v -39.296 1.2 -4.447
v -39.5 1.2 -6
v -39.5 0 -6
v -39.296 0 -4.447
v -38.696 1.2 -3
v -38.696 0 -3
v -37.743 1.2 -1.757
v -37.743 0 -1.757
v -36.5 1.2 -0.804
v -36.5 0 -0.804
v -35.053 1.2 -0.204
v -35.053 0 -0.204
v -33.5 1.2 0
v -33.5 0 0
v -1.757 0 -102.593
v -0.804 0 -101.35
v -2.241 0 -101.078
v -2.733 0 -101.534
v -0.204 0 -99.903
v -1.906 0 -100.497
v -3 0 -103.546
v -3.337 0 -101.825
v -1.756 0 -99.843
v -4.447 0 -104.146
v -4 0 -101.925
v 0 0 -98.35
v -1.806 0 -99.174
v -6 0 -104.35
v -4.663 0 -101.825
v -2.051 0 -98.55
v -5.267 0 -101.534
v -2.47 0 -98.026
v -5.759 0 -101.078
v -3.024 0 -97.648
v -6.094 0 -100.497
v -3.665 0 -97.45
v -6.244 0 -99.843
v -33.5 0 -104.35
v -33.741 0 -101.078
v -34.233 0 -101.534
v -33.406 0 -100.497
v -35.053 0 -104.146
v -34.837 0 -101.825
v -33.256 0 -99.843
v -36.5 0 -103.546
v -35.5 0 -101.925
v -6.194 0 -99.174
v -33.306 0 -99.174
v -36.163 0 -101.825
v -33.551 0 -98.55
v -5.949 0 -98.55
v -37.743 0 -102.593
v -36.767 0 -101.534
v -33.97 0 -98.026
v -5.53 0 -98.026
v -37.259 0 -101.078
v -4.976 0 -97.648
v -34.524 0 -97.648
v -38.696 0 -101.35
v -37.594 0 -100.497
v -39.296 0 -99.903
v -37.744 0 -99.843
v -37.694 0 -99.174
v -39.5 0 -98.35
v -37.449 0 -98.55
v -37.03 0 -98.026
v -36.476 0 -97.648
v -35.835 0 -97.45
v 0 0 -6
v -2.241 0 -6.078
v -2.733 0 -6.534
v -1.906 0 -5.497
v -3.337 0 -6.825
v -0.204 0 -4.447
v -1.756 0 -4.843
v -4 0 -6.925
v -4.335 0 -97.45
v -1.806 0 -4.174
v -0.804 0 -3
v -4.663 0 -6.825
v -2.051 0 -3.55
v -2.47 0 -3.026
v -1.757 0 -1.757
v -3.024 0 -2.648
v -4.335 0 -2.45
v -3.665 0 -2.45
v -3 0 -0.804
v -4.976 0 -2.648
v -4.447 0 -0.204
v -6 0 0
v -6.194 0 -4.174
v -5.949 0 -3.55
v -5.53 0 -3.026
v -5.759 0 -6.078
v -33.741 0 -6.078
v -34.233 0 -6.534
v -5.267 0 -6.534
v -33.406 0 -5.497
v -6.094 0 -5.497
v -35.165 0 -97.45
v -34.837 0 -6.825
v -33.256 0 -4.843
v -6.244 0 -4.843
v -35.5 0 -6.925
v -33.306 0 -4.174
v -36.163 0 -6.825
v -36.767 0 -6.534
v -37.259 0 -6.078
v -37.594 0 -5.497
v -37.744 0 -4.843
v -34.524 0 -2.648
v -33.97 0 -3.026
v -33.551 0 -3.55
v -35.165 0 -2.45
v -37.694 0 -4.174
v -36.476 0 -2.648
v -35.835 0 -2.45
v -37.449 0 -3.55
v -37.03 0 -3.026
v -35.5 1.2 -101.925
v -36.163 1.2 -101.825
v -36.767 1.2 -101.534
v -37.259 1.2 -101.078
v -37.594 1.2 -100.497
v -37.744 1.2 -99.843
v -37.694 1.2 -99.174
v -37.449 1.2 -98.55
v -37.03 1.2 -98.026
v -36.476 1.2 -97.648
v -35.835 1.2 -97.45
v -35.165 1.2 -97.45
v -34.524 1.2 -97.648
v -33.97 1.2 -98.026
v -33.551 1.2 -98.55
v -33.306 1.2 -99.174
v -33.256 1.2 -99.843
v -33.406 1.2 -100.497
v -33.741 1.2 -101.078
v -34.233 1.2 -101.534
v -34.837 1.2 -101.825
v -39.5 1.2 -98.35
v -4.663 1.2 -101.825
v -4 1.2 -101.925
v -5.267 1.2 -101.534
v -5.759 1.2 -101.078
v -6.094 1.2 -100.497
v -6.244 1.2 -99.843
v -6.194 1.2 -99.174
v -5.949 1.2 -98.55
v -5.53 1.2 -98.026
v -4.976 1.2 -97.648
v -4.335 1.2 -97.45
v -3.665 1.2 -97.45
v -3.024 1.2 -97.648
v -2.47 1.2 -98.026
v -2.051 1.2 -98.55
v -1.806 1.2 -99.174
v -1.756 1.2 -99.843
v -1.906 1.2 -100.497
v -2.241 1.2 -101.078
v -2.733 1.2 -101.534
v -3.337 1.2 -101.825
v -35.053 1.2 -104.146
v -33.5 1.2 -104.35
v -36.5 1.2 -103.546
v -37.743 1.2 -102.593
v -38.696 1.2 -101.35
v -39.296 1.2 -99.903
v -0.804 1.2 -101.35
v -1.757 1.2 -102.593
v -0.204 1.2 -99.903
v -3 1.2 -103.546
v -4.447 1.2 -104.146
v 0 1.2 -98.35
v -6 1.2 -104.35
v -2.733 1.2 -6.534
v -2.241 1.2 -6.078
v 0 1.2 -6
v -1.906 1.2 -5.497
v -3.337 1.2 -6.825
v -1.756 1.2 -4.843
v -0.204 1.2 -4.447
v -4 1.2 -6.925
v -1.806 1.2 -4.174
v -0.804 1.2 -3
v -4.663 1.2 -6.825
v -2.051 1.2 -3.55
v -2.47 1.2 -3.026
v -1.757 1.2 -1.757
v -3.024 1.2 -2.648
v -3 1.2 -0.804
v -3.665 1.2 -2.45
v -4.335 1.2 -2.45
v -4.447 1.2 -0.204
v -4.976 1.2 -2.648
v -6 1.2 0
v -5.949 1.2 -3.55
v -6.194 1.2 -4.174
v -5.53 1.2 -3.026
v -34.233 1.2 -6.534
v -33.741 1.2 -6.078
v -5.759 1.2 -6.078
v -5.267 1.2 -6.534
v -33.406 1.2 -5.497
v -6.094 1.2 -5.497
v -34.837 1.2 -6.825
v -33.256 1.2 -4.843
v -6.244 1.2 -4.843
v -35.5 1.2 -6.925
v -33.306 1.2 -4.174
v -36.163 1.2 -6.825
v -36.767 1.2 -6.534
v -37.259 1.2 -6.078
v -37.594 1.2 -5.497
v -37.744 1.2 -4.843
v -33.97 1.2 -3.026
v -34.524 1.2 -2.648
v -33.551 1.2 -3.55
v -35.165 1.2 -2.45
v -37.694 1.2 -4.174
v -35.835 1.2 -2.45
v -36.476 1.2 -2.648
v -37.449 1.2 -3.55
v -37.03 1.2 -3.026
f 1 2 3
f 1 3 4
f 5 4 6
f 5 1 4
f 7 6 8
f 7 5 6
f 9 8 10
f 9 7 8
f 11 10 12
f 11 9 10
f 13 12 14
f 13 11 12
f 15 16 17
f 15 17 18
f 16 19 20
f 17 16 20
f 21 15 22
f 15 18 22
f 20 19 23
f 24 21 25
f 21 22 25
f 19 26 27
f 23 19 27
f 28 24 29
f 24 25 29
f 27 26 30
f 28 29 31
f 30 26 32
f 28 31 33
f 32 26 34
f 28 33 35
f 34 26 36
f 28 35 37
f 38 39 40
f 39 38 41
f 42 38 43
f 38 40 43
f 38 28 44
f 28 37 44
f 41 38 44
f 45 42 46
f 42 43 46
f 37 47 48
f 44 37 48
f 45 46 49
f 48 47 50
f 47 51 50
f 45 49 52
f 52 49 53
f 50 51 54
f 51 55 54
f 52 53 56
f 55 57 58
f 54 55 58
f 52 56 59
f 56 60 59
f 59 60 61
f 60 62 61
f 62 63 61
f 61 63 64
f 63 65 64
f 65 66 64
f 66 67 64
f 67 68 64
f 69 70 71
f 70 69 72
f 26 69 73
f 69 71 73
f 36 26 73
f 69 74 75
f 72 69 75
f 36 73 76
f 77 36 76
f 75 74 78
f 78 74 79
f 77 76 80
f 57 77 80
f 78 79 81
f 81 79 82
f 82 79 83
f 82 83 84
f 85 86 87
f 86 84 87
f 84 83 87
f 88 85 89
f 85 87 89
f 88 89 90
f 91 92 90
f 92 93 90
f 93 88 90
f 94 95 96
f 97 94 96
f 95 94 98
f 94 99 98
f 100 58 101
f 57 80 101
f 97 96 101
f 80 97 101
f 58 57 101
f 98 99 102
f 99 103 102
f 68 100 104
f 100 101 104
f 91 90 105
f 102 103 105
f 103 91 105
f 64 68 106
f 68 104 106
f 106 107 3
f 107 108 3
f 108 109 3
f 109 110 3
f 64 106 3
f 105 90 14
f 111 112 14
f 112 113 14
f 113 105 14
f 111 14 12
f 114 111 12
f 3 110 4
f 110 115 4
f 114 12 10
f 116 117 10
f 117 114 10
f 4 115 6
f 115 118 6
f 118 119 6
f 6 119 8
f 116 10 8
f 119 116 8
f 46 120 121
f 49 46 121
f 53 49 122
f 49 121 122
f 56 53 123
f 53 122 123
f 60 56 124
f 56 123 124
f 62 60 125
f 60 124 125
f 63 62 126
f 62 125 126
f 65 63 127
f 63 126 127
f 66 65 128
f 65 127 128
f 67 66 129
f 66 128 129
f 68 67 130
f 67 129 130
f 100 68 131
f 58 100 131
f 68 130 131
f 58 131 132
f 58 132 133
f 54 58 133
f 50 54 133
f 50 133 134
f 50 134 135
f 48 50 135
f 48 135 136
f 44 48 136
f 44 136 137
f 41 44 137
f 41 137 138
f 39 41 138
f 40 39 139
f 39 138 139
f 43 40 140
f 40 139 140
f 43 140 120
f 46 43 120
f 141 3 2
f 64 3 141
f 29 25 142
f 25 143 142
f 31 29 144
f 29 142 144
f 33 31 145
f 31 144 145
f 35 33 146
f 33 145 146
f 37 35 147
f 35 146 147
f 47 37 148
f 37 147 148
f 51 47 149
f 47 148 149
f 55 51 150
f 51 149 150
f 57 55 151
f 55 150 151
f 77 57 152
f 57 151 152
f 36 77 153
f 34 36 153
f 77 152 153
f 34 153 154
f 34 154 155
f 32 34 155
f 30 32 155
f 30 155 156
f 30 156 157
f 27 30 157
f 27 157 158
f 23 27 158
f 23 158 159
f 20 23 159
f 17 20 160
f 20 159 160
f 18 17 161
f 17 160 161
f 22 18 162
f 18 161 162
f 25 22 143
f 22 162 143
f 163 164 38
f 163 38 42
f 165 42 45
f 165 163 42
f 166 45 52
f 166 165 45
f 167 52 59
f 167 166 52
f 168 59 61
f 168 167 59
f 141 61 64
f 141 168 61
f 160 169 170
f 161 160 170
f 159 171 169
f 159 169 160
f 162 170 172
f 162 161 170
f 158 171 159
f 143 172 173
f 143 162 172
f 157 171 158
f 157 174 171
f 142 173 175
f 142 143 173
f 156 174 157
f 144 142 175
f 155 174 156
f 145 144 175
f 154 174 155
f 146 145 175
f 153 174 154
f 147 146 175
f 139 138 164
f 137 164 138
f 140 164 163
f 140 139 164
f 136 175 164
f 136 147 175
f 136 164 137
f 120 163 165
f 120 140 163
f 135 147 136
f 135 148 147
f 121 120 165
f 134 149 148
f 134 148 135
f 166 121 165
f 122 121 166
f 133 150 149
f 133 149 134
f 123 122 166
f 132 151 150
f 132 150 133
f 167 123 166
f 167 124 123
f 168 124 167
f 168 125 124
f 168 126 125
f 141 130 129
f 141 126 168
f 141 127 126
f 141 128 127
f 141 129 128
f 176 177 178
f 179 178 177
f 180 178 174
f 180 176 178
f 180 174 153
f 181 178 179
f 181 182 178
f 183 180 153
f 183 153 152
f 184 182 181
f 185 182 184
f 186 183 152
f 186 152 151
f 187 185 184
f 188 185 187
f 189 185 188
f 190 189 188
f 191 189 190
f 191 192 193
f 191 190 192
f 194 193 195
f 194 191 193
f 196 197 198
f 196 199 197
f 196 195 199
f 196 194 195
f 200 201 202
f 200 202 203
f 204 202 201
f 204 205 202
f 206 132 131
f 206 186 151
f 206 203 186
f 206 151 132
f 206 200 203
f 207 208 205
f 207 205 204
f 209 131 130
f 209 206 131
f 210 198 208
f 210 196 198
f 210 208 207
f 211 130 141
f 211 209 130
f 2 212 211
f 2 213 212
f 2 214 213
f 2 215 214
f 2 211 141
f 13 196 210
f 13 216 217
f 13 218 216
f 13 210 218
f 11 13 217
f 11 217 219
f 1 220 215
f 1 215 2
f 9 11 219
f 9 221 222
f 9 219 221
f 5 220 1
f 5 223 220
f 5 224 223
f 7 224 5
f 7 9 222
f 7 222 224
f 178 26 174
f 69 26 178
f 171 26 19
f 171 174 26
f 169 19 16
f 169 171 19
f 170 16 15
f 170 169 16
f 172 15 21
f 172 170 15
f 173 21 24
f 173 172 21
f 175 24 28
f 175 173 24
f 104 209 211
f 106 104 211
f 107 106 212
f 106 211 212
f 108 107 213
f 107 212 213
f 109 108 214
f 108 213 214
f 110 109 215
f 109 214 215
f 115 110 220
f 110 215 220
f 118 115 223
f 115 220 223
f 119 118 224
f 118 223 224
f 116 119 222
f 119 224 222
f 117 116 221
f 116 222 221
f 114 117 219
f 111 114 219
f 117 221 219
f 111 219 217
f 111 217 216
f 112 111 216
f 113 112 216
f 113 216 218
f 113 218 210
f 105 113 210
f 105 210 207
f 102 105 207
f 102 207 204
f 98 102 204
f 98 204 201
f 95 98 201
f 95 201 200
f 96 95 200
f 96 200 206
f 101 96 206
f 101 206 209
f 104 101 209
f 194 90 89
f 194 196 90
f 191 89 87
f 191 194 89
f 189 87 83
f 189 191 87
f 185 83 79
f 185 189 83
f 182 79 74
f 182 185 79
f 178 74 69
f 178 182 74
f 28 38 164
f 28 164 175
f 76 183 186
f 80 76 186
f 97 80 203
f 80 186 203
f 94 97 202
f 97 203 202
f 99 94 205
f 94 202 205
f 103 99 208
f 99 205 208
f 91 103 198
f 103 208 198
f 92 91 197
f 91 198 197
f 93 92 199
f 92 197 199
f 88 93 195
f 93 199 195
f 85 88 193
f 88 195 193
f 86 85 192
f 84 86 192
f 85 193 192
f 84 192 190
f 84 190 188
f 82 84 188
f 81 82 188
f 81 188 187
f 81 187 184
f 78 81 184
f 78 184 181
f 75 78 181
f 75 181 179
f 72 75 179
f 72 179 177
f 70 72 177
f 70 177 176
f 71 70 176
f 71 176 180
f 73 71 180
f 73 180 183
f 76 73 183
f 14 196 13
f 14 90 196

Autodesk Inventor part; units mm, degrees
ref_plane "YZ Plane" through (0, 0, 0) normal (1, 0, 0) x (0, 1, 0)
ref_plane "XZ Plane" through (0, 0, 0) normal (0, 1, 0) x (-1, 0, 0)
ref_plane "XY Plane" through (0, 0, 0) normal (0, 0, 1) x (1, 0, 0)
sketch "Sketch1" plane through (0, 0, 0) normal (0, 1, 0) x (-1, 0, 0)
  line L0 (0, 0) -> (39.5, 0)
  line L1 (39.5, 0) -> (39.5, -104.35)
  line L2 (39.5, -104.35) -> (0, -104.35)
  line L3 (0, -104.35) -> (0, 0)
  dimension "d0" = 104.35
  dimension "d1" = 39.5
extrude "Extrusion1" add sketch "Sketch1" along normal blind 1.2
fillet "Fillet1" radius 6 4 edges at (0, 0.6, 0) (-39.5, 0.6, 0) (0, 0.6, -104.35) (-39.5, 0.6, -104.35)
sketch "Sketch2" plane through (0, 0, 0) normal (0, -1, 0) x (1, 0, 0)
  line L0 (-35.5, -99.675) -> (-4, -99.675) construction
  line L1 (-4, -99.675) -> (-4, -4.675) construction
  line L2 (-4, -4.675) -> (-35.5, -4.675) construction
  line L3 (-35.5, -4.675) -> (-35.5, -99.675) construction
  line L4 (0, -98.35) -> (0, -6) construction
  line L5 (-39.5, -6) -> (-39.5, -98.35) construction
  line L6 (-6, 0) -> (-33.5, 0) construction
  line L7 (-33.5, -104.35) -> (-6, -104.35) construction
  point P0 (0, 0)
  dimension "d5" = 95
  dimension "d6" = 31.5
  dimension "d7" = 39.5
  dimension "d8" = 4
  dimension "d9" = 104.35
  dimension "d10" = 4.675
hole "Hole1" at (-35.5, 0, -99.675) at (-4, 0, -99.675) at (-4, 0, -4.675) at (-35.5, 0, -4.675) direction (0, 1, 0) diameter 4.5 depth 1.2 clearance for "Flat Head Machine Screw" size "M4" standard "Ansi Metric M Profile"
equation "\"d8\" = -0.5 * d6 + 0.5 * d7"
equation "\"d10\" = -0.5 * d5 + 0.5 * d9"
properties part number "PCB"
